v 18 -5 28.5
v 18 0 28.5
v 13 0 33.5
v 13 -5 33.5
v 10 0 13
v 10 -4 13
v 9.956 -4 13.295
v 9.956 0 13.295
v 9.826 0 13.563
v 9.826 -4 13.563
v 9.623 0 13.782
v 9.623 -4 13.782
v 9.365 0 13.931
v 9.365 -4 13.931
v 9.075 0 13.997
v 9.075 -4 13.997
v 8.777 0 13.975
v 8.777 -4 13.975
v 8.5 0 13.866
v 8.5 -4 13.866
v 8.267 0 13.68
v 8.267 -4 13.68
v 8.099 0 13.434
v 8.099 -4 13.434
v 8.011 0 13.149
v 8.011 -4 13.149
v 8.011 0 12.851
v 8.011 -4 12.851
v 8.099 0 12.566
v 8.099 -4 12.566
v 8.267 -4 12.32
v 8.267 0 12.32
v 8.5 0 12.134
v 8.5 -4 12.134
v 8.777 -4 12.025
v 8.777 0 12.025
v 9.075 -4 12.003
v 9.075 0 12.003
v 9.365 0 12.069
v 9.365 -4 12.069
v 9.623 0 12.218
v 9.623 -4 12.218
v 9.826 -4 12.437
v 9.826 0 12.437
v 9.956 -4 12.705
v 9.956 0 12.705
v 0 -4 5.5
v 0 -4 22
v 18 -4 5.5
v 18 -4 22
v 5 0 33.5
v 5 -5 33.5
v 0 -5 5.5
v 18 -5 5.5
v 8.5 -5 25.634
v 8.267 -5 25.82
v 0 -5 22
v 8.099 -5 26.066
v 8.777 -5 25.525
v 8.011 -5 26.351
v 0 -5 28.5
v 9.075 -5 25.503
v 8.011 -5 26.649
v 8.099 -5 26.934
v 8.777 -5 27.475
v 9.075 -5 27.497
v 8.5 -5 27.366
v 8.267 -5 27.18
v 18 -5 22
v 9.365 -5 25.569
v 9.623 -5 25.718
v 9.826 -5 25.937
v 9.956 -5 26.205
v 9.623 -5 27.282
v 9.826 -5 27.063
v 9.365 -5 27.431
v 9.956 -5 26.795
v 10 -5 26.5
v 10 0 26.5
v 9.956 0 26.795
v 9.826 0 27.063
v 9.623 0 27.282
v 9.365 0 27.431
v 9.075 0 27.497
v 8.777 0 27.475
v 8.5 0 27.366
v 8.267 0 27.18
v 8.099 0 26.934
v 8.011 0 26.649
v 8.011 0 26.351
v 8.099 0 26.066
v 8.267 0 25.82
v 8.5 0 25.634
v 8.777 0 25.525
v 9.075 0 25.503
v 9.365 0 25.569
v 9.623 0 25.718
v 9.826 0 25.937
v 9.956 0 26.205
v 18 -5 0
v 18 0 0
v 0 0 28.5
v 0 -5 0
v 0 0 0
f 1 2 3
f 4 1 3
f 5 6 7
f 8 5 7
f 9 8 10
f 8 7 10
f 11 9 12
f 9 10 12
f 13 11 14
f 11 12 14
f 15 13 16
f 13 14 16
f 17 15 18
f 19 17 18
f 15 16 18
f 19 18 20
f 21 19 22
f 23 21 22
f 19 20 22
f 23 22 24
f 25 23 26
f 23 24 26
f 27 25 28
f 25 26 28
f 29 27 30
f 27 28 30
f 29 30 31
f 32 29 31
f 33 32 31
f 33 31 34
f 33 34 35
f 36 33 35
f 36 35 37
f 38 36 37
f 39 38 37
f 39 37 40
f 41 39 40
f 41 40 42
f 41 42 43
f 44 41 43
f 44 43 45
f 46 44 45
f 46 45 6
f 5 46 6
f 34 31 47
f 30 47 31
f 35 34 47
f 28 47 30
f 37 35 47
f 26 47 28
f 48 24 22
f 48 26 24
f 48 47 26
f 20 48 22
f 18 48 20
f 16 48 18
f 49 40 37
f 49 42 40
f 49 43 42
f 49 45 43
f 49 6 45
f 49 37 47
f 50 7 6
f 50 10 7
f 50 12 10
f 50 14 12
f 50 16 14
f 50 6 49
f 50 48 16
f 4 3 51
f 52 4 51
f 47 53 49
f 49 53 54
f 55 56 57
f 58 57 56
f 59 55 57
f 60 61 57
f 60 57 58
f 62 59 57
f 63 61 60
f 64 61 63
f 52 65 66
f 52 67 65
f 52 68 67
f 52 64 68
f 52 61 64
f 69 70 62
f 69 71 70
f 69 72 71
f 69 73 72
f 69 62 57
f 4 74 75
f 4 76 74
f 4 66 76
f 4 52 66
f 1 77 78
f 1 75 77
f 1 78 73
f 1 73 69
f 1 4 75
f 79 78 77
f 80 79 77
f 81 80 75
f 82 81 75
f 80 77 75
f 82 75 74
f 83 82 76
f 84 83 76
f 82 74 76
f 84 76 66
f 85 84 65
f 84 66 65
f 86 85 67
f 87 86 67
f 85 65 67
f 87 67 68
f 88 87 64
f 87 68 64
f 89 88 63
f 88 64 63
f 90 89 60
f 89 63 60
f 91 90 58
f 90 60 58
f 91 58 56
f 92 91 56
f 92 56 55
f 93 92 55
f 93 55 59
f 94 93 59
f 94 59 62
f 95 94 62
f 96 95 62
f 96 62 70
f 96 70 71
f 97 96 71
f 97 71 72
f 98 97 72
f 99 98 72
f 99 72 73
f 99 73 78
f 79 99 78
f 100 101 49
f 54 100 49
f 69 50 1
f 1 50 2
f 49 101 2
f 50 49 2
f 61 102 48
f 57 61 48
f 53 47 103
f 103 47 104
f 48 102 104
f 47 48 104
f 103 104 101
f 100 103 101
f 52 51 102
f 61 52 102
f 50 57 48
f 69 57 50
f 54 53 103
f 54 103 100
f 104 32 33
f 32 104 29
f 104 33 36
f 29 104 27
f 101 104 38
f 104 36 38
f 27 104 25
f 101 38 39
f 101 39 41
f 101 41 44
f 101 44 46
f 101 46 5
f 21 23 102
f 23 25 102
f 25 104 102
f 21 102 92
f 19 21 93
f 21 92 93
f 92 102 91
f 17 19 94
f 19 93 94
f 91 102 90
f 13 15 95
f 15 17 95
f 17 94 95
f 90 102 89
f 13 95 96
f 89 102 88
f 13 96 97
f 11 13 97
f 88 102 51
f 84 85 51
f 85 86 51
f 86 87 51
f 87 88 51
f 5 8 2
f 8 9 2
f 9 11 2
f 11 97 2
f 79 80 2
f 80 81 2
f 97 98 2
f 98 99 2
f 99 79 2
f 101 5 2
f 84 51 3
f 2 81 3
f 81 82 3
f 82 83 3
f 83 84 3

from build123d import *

# Parameters (mm, degrees)
F1_DEPTH = 5
F2_W     = 18
F2_H     = 16.5
F3_DEPTH = 1
F4_R     = 1
F5_DEPTH = 5.001
F6_R     = 1
F7_DEPTH = 4.001


with BuildPart() as f1:
    # F0 (on Front) → F1 (new body)
    with BuildSketch(Plane.XZ):
        Polygon((0, 28.5), (0, 0), (18, 0), (18, 28.5), (13, 33.5), (5, 33.5), align=None)
    extrude(amount=F1_DEPTH)

    # F2 (on face) → F3 (cut)
    with BuildSketch(Plane.XZ.offset(5)):
        with Locations((9, 13.75)):
            Rectangle(F2_W, F2_H)
    extrude(amount=-F3_DEPTH, mode=Mode.SUBTRACT)

    # F4 (on face) → F5 (cut, through all)
    with BuildSketch(Plane.XZ.offset(5)):
        with Locations((9, 26.5)):
            Circle(F4_R)
    extrude(amount=-F5_DEPTH, mode=Mode.SUBTRACT)

    # F6 (on face) → F7 (cut, through all)
    with BuildSketch(Plane.XZ.offset(4)):
        with Locations((9, 13)):
            Circle(F6_R)
    extrude(amount=-F7_DEPTH, mode=Mode.SUBTRACT)


solid = f1.part
